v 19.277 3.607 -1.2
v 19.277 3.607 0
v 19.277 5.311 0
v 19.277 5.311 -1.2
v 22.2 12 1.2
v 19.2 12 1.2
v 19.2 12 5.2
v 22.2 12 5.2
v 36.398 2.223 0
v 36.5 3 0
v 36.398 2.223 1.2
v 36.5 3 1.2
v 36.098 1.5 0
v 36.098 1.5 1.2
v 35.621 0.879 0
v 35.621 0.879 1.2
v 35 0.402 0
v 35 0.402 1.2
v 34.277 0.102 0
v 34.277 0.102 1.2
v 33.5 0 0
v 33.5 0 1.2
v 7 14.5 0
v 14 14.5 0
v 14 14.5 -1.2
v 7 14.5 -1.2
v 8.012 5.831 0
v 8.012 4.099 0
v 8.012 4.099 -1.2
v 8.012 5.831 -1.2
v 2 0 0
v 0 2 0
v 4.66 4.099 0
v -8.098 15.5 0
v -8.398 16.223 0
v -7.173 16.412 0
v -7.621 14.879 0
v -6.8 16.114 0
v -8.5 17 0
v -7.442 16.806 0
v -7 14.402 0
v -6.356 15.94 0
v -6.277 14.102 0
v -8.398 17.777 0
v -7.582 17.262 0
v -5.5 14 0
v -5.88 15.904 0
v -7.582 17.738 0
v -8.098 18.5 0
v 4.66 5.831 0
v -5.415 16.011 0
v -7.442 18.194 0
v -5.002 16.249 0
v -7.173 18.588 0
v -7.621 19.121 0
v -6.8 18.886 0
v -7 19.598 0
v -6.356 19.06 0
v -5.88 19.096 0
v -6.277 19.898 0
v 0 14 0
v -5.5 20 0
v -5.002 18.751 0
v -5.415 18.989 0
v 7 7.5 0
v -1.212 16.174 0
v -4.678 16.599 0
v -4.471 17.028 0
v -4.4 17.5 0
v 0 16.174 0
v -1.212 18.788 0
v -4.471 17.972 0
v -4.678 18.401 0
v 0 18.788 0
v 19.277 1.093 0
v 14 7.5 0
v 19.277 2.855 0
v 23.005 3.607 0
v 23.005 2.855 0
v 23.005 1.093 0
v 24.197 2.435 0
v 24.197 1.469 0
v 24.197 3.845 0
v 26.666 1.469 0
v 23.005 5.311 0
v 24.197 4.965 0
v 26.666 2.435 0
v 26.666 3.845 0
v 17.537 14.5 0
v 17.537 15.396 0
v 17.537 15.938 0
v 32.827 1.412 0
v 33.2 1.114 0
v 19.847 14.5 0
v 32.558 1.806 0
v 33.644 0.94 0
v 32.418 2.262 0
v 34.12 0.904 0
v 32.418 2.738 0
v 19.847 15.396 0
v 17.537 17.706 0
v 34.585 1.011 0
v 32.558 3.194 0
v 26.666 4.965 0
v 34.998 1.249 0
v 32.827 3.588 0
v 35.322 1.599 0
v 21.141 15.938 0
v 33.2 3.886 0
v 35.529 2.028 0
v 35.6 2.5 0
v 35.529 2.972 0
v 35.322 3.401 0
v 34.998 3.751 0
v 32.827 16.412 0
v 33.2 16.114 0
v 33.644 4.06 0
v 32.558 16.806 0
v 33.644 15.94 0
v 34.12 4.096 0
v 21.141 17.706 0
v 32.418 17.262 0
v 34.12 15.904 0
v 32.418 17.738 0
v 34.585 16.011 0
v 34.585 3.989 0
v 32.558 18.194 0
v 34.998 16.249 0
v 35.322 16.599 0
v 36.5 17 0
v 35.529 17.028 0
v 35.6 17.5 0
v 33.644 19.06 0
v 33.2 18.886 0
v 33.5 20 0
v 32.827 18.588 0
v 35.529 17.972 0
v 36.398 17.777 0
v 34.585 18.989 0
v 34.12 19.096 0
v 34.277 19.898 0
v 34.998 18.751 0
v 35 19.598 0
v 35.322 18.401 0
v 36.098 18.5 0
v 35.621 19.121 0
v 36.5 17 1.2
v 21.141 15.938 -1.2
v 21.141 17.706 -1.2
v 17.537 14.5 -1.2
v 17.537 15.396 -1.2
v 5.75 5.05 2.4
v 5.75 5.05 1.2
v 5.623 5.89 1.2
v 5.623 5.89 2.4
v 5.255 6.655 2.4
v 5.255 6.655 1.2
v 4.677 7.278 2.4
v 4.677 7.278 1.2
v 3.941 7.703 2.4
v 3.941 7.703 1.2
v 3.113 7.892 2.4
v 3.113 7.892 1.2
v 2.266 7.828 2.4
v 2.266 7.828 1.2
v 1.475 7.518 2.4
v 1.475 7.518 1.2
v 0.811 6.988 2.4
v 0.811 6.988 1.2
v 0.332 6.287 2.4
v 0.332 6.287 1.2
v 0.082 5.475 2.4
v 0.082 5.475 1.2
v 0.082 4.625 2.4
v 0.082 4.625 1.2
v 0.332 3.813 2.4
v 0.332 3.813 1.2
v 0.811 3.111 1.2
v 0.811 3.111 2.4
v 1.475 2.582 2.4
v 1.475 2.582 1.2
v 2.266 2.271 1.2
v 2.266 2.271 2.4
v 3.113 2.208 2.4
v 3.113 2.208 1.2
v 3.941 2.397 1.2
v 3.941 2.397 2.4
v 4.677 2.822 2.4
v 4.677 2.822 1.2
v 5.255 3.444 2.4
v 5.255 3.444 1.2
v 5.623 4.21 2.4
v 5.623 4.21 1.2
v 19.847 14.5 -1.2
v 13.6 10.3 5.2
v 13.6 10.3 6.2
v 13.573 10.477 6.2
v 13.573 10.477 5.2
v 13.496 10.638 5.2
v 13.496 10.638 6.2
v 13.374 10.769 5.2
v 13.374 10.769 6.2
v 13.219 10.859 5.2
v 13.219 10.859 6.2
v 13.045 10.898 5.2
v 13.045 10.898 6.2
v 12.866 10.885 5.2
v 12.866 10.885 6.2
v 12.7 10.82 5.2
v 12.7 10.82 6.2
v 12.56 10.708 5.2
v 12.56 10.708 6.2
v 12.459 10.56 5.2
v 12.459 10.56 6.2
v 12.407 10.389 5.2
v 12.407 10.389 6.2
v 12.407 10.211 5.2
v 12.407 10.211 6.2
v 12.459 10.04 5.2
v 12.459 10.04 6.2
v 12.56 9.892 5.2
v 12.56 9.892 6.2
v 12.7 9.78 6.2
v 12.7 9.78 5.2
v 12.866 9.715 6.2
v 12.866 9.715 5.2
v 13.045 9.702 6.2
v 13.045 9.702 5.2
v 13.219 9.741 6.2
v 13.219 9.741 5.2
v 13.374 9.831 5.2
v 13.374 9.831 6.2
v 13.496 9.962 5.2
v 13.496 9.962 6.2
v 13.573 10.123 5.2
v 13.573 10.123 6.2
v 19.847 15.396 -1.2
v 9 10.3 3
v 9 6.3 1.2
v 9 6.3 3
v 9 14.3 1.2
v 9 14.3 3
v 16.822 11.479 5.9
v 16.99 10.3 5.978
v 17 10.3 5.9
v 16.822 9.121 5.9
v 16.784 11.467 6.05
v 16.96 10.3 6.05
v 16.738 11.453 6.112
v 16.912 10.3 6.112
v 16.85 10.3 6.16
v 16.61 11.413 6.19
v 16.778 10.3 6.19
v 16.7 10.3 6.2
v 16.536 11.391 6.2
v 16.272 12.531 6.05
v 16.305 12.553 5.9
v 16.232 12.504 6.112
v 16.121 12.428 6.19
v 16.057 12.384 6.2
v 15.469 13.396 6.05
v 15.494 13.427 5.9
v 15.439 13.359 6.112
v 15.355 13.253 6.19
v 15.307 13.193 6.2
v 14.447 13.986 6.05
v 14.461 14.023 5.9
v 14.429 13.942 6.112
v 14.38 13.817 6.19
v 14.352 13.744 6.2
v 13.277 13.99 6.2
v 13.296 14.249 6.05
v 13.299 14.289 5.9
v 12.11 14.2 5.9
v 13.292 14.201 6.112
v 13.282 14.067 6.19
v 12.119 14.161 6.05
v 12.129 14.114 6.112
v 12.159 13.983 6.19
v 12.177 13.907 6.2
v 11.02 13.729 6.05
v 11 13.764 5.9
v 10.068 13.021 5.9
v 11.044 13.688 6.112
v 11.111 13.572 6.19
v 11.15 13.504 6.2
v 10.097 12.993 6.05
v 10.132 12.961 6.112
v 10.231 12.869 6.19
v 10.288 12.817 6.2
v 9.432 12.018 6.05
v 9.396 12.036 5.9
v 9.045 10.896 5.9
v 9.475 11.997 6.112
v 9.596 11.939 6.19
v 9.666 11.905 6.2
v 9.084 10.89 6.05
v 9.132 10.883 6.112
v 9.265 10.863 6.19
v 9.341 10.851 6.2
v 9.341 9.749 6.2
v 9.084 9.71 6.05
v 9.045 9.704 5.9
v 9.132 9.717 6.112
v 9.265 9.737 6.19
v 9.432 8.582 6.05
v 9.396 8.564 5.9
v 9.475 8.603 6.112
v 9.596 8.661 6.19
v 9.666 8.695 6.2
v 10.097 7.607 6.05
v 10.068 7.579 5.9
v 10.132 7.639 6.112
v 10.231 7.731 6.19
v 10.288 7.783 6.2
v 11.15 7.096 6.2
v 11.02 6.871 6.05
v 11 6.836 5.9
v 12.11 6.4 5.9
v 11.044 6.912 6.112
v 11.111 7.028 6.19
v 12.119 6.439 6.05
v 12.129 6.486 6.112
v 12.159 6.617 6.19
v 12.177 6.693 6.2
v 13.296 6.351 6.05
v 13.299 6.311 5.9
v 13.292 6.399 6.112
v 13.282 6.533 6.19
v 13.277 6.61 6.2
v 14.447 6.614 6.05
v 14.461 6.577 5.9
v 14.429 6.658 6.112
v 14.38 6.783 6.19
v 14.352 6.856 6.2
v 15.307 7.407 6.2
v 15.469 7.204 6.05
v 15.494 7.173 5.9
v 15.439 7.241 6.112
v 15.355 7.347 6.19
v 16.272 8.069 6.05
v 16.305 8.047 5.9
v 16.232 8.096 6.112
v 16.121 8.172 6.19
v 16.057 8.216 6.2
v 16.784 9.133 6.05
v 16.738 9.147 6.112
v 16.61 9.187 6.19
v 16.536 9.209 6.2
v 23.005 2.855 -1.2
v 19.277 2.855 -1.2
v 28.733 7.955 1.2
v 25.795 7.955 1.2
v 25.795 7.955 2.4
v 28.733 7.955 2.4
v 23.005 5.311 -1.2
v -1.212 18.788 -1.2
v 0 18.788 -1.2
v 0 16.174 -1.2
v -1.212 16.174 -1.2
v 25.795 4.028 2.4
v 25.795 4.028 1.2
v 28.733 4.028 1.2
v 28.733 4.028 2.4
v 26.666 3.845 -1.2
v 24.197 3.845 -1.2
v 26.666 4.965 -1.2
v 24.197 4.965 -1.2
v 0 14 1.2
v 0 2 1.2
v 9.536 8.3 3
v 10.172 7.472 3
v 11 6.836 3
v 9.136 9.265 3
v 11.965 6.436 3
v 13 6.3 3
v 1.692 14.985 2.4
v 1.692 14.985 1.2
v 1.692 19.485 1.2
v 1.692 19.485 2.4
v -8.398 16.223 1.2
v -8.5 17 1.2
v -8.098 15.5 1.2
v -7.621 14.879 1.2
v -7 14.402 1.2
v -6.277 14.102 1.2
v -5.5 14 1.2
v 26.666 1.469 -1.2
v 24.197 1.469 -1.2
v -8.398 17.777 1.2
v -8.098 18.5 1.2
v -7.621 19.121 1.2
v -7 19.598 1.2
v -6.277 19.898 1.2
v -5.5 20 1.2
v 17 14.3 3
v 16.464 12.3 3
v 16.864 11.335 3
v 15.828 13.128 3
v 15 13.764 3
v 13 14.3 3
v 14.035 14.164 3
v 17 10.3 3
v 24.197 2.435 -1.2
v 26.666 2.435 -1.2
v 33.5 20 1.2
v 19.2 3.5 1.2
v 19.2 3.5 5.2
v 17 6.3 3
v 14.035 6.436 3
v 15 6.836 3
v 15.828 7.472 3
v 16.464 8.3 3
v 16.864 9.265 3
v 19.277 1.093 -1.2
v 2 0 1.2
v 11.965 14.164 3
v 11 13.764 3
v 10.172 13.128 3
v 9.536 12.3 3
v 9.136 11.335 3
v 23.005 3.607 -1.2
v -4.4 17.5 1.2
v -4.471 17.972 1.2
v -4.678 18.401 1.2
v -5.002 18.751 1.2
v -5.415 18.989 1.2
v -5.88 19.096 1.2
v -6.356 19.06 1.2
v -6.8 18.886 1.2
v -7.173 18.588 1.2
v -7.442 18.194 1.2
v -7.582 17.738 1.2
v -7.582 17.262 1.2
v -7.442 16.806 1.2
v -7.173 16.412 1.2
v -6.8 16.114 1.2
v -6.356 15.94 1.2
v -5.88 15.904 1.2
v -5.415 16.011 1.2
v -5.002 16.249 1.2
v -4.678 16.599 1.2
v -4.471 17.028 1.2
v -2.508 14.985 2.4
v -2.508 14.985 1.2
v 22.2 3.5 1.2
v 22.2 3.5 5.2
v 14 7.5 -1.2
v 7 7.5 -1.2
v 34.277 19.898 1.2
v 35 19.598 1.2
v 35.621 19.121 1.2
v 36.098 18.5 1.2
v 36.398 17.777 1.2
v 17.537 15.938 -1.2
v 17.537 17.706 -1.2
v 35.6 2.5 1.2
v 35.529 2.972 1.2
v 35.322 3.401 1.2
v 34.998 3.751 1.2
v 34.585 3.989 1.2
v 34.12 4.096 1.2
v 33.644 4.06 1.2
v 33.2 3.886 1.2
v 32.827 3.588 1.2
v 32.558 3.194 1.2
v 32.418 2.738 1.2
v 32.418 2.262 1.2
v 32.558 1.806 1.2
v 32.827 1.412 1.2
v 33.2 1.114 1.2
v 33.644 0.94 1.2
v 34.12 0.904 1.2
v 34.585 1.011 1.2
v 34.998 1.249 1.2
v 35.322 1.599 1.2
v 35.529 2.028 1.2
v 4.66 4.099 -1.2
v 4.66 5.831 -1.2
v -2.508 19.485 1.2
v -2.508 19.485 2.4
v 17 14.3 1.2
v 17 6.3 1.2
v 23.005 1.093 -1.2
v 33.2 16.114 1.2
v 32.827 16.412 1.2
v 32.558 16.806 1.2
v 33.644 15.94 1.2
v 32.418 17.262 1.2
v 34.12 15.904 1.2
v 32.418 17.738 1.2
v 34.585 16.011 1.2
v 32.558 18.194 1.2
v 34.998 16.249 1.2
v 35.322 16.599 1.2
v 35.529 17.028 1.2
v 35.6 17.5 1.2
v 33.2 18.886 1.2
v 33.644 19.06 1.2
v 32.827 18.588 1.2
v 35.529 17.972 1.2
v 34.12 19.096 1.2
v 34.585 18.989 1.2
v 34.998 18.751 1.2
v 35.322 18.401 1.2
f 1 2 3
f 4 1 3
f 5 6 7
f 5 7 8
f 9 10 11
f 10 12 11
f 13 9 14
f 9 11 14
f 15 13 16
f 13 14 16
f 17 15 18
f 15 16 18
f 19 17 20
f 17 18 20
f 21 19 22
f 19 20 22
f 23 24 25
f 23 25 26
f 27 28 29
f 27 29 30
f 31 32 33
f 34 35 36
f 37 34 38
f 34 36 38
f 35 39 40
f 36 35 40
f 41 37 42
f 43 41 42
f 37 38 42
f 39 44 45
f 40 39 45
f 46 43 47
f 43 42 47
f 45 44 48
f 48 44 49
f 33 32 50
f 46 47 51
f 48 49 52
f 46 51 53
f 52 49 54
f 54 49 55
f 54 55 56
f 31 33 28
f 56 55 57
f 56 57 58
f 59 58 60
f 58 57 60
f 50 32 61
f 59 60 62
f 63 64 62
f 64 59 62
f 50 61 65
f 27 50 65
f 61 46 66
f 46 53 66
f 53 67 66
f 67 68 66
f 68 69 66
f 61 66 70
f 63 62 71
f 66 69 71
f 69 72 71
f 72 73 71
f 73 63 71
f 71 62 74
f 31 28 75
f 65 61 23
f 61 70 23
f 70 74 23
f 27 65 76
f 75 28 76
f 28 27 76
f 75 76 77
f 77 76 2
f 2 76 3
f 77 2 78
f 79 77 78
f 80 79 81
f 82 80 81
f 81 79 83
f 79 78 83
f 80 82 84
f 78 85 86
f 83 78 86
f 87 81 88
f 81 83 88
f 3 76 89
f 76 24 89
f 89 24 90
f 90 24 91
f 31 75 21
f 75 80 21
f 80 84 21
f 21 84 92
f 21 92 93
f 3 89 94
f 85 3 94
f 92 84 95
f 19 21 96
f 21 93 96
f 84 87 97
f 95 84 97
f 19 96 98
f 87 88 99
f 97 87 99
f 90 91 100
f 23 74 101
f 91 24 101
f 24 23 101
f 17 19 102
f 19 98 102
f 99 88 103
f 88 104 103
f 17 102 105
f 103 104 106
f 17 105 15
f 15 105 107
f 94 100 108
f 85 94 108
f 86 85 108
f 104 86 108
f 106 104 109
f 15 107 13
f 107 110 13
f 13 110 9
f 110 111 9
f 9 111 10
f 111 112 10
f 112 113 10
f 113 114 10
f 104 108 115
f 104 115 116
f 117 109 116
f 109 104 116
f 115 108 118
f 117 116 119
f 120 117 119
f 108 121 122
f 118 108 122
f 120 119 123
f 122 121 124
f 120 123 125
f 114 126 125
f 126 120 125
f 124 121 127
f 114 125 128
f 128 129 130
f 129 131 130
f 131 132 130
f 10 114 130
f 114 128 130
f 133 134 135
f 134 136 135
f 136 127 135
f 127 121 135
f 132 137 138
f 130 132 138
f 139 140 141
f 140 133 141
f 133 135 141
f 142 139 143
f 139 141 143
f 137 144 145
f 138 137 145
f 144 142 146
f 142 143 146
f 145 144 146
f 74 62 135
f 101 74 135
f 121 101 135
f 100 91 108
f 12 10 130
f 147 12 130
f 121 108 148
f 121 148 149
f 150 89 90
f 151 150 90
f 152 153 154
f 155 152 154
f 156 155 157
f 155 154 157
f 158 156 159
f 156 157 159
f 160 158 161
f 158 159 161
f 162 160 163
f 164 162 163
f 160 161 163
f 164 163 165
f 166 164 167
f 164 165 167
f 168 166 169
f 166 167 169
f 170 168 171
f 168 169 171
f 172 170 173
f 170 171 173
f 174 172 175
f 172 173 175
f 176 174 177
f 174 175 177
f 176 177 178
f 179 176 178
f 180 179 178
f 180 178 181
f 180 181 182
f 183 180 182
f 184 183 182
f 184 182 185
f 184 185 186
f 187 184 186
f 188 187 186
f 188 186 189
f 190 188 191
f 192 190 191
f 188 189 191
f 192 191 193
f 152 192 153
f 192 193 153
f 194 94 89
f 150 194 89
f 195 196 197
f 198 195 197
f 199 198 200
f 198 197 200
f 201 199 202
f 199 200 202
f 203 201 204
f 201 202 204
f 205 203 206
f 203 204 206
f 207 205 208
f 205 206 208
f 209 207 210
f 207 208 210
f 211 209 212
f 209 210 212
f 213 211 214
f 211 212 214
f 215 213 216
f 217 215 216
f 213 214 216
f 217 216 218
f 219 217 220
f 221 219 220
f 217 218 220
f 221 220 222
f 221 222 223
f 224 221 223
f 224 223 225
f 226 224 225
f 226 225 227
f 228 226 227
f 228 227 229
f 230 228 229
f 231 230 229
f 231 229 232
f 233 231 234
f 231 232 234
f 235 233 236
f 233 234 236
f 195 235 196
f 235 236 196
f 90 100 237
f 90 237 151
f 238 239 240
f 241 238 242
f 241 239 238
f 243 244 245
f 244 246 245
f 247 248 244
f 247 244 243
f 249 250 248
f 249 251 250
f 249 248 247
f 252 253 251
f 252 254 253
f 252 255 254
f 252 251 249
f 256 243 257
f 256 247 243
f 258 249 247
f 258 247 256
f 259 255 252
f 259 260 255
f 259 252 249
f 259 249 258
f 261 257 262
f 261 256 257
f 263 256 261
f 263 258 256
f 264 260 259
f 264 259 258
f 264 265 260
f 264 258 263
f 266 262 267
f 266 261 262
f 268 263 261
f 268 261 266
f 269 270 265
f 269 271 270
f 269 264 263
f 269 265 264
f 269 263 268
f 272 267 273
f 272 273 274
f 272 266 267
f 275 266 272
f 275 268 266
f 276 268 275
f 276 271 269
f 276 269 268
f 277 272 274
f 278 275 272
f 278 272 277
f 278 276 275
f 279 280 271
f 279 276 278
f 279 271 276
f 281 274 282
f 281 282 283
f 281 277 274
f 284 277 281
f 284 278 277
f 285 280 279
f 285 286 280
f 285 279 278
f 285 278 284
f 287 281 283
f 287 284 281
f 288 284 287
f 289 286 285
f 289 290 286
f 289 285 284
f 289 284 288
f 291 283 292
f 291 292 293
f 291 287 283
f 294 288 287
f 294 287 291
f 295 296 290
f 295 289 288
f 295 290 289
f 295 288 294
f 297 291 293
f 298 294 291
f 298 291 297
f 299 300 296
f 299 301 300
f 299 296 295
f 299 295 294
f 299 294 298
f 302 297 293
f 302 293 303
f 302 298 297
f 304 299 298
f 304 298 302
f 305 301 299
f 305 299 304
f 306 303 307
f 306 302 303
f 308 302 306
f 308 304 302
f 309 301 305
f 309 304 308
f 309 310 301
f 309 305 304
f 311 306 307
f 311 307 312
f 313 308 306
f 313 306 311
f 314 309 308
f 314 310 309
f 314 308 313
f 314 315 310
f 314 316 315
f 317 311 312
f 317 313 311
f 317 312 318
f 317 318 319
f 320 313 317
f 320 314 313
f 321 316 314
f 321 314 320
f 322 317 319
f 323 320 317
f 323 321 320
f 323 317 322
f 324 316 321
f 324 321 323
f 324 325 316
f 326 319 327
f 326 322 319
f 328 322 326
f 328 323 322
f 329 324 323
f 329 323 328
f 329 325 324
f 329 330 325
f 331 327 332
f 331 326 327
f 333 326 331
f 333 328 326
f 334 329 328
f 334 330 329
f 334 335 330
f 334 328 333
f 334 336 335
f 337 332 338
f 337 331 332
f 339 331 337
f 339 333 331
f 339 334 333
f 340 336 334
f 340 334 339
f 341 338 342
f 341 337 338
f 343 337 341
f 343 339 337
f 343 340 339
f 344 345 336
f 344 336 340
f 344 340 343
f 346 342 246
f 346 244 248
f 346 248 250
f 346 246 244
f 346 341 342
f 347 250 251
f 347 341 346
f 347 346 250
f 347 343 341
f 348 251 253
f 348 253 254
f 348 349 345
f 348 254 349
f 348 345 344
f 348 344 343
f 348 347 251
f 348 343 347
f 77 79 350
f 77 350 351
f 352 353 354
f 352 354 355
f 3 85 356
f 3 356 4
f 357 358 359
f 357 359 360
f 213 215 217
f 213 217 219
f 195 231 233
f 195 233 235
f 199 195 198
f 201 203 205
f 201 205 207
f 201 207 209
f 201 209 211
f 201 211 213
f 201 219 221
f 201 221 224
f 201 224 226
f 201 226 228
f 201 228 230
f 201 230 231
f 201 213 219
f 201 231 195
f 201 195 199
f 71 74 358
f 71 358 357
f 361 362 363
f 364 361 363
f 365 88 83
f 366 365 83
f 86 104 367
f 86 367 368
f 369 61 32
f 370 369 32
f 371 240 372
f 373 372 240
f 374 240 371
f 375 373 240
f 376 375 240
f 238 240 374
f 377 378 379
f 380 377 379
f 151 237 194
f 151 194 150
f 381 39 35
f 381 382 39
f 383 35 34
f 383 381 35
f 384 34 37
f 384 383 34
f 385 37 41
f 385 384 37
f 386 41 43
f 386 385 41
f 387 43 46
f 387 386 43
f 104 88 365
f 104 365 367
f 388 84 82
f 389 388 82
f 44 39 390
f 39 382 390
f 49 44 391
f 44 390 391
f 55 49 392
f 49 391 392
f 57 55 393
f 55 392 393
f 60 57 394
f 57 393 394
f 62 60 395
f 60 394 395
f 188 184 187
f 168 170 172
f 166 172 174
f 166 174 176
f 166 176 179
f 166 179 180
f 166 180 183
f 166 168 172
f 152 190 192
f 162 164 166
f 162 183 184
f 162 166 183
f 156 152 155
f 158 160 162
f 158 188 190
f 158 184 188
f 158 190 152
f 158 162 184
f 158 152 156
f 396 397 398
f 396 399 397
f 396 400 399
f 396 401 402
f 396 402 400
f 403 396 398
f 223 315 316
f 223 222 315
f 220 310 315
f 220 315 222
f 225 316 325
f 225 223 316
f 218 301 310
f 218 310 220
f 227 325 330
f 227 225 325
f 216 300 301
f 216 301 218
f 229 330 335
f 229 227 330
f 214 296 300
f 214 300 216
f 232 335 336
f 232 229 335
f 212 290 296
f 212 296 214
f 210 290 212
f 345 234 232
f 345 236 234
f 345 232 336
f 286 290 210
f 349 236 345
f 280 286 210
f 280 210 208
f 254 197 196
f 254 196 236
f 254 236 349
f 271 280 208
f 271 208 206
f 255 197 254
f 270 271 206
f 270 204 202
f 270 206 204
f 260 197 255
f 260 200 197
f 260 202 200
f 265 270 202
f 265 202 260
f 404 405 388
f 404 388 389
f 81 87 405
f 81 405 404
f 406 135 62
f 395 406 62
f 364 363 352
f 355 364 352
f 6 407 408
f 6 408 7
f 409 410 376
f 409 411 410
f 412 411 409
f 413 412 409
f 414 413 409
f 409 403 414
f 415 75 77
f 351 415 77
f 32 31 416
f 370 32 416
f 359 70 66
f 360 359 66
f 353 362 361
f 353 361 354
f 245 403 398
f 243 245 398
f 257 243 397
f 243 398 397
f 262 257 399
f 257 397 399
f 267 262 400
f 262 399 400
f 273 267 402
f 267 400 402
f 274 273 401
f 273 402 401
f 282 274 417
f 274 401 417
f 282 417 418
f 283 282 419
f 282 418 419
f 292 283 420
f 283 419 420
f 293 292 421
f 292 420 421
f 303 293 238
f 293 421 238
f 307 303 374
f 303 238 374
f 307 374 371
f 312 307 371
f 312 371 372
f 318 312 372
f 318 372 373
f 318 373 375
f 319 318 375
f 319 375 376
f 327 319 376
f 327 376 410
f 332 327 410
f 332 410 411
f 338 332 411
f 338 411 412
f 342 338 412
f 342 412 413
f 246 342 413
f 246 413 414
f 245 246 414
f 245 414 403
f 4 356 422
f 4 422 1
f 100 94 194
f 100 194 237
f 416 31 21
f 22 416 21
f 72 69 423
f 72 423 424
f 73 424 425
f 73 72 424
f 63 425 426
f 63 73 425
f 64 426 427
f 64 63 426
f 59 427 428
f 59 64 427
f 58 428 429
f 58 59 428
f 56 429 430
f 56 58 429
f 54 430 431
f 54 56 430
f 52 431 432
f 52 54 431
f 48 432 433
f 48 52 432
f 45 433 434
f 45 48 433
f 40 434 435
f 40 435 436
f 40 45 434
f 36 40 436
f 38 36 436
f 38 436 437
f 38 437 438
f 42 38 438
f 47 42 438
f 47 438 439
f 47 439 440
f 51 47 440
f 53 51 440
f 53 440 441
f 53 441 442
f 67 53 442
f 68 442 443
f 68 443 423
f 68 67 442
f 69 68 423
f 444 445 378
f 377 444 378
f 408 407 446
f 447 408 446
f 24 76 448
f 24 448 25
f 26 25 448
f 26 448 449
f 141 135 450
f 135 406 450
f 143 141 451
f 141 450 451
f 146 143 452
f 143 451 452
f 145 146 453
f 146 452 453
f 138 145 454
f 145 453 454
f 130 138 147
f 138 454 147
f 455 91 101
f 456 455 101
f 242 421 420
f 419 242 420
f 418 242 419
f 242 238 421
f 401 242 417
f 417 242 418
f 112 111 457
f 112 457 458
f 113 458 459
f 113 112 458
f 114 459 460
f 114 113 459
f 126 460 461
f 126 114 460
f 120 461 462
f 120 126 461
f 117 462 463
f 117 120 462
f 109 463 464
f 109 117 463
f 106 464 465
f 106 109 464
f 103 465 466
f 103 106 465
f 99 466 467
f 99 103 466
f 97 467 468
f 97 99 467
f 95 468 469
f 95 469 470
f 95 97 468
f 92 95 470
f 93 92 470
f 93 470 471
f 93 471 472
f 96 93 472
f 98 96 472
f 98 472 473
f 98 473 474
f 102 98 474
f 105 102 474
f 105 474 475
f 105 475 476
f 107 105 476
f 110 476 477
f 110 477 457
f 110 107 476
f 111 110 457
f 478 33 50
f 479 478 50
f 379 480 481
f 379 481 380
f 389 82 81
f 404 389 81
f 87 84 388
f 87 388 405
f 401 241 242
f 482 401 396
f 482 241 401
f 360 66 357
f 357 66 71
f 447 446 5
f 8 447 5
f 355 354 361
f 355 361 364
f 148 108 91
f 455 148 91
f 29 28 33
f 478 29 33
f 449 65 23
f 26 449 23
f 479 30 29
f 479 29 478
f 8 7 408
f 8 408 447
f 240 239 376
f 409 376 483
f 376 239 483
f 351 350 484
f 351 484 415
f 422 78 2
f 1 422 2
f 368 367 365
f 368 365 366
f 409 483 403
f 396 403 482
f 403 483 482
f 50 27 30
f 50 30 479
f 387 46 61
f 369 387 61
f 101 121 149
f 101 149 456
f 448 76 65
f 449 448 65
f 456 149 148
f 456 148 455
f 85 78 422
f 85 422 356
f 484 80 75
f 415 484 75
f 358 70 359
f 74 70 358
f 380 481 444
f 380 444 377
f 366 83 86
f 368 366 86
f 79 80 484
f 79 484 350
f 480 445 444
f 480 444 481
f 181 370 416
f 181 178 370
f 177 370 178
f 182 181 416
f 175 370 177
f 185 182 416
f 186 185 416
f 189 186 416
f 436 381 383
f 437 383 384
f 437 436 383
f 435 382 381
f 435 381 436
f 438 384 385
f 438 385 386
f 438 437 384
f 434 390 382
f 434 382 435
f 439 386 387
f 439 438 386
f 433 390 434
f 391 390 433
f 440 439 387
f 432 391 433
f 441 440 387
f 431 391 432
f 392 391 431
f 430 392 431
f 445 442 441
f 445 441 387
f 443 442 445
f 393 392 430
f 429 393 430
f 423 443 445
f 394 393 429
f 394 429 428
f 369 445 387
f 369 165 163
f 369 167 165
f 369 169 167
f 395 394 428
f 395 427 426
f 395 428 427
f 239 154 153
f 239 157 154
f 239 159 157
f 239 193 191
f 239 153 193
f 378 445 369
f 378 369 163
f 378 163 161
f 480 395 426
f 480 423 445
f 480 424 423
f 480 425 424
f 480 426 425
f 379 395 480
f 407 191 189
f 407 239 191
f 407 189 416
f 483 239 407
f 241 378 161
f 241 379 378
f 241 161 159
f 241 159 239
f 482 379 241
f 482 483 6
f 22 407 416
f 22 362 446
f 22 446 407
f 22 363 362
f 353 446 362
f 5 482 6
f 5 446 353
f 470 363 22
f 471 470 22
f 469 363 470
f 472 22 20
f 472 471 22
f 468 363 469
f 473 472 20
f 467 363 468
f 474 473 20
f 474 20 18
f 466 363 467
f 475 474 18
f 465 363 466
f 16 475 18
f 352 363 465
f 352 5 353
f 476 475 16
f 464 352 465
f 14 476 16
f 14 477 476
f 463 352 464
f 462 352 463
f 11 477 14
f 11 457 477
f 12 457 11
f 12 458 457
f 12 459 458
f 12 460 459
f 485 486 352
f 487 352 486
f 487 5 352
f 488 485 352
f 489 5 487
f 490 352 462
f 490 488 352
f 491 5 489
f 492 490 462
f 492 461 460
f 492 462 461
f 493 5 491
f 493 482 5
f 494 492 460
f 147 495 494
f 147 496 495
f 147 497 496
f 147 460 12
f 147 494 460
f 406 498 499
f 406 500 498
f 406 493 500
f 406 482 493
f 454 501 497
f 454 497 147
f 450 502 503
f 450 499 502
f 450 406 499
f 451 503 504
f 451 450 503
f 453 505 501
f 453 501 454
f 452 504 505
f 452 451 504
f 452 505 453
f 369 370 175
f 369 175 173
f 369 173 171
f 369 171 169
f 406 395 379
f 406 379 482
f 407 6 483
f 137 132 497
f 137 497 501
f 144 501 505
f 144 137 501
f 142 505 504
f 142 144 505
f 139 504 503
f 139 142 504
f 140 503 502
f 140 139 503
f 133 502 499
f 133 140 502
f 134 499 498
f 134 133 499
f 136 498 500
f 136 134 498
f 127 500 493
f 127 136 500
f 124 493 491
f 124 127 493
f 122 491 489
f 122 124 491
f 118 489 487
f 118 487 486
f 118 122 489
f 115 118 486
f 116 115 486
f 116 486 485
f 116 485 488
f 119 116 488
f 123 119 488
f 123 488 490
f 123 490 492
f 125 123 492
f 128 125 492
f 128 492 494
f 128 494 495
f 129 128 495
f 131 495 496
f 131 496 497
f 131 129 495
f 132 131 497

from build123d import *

# Parameters (mm, degrees)
SKETCH1_R           = 1.6
BOSS_EXTRUDE1_DEPTH = 1.2
SKETCH2_R           = 2.85
SKETCH2_W           = 2.937952631
SKETCH2_H           = 3.927283648
SKETCH2_W_2         = 4.2
SKETCH2_H_2         = 4.5
BOSS_EXTRUDE2_DEPTH = 1.2
SKETCH3_W           = 8
SKETCH3_H           = 8
BOSS_EXTRUDE3_DEPTH = 1.8
SKETCH4_R           = 4
BOSS_EXTRUDE4_DEPTH = 3.2
SKETCH5_R           = 0.6
CUT_EXTRUDE1_DEPTH  = 1
SKETCH7_W           = 7
SKETCH7_H           = 7
SKETCH7_W_2         = 3.728136851
SKETCH7_H_2         = 1.761566417
SKETCH7_H_3         = 1.704612402
SKETCH7_W_3         = 3.603269321
SKETCH7_H_4         = 1.768357774
SKETCH7_W_4         = 3.352143609
SKETCH7_H_5         = 1.732407439
SKETCH7_W_5         = 1.212415991
SKETCH7_H_6         = 2.614149225
SKETCH7_W_6         = 2.309899449
SKETCH7_H_7         = 0.895937988
SKETCH7_W_7         = 2.468868555
SKETCH7_H_8         = 1.120250043
SKETCH7_H_9         = 0.966414447
BOSS_EXTRUDE5_DEPTH = 1.2
SKETCH8_W           = 3
SKETCH8_H           = 8.5
BOSS_EXTRUDE6_DEPTH = 4
FILLET1_R           = 0.3
FILLET2_R           = 3
CHAMFER1_SIZE       = 2


with BuildPart() as part:
    # Sketch1 → Boss-Extrude1 (new body)
    with BuildSketch(Plane.XY):
        Polygon((0, 20), (-8.5, 20), (-8.5, 14), (0, 14), (0, 0), (36.5, 0), (36.5, 20), align=None)
        with Locations((-6, 17.5)):
            Circle(SKETCH1_R, mode=Mode.SUBTRACT)
        with Locations((34, 2.5)):
            Circle(SKETCH1_R, mode=Mode.SUBTRACT)
        with Locations((34, 17.5)):
            Circle(SKETCH1_R, mode=Mode.SUBTRACT)
    extrude(amount=BOSS_EXTRUDE1_DEPTH)

    # Sketch2 → Boss-Extrude2 (add)
    with BuildSketch(Plane.XY.offset(1.2)):
        with Locations((2.9, 5.049940133)):
            Circle(SKETCH2_R)
        with Locations((27.263972555, 5.991759132)):
            Rectangle(SKETCH2_W, SKETCH2_H)
        with Locations((-0.408107806, 17.235427956)):
            Rectangle(SKETCH2_W_2, SKETCH2_H_2)
    extrude(amount=BOSS_EXTRUDE2_DEPTH)

    # Sketch3 → Boss-Extrude3 (add)
    with BuildSketch(Plane.XY.offset(1.2)):
        with Locations((13, 10.3)):
            Rectangle(SKETCH3_W, SKETCH3_H)
    extrude(amount=BOSS_EXTRUDE3_DEPTH)

    # Sketch4 → Boss-Extrude4 (add)
    with BuildSketch(Plane.XY.offset(3)):
        with Locations((13, 10.3)):
            Circle(SKETCH4_R)
    extrude(amount=BOSS_EXTRUDE4_DEPTH)

    # Sketch5 → Cut-Extrude1 (cut)
    with BuildSketch(Plane.XY.offset(6.2)):
        with Locations((13, 10.3)):
            Circle(SKETCH5_R)
    extrude(amount=-CUT_EXTRUDE1_DEPTH, mode=Mode.SUBTRACT)

    # Sketch7 → Boss-Extrude5 (add)
    with BuildSketch(Plane(origin=(0, 0, 0), x_dir=(-1, 0, 0), z_dir=(0, 0, -1))):
        with Locations((-10.5, 11)):
            Rectangle(SKETCH7_W, SKETCH7_H)
        with Locations((-21.140690462, 1.973810546)):
            Rectangle(SKETCH7_W_2, SKETCH7_H_2)
        with Locations((-21.140690462, 4.459014526)):
            Rectangle(SKETCH7_W_2, SKETCH7_H_3)
        with Locations((-19.339055802, 16.82217617)):
            Rectangle(SKETCH7_W_3, SKETCH7_H_4)
        with Locations((-6.335774559, 4.965027996)):
            Rectangle(SKETCH7_W_4, SKETCH7_H_5)
        with Locations((0.606207996, 17.481290904)):
            Rectangle(SKETCH7_W_5, SKETCH7_H_6)
        with Locations((-18.692370866, 14.947968994)):
            Rectangle(SKETCH7_W_6, SKETCH7_H_7)
        with Locations((-25.431234808, 4.404902976)):
            Rectangle(SKETCH7_W_7, SKETCH7_H_8)
        with Locations((-25.431234808, 1.951905582)):
            Rectangle(SKETCH7_W_7, SKETCH7_H_9)
    extrude(amount=BOSS_EXTRUDE5_DEPTH)

    # Sketch8 → Boss-Extrude6 (add)
    with BuildSketch(Plane.XY.offset(1.2)):
        with Locations((20.7, 7.75)):
            Rectangle(SKETCH8_W, SKETCH8_H)
    extrude(amount=BOSS_EXTRUDE6_DEPTH)

    # Fillet1
    fillet1_edges = [part.edges().sort_by_distance(p)[0] for p in [
        (9, 10.3, 6.2),
    ]]
    fillet(fillet1_edges, radius=FILLET1_R)

    # Fillet2
    fillet2_edges = [part.edges().sort_by_distance(p)[0] for p in [
        (36.5, 20, 0.6),
        (36.5, 0, 0.6),
        (-8.5, 14, 0.6),
        (-8.5, 20, 0.6),
    ]]
    fillet(fillet2_edges, radius=FILLET2_R - 0.0001)  # a hair under: the kernel refuses the full size

    # Chamfer1
    chamfer1_edges = [part.edges().sort_by_distance(p)[0] for p in [
        (0, 0, 0.6),
    ]]
    chamfer(chamfer1_edges, length=CHAMFER1_SIZE)


solid = part.part
